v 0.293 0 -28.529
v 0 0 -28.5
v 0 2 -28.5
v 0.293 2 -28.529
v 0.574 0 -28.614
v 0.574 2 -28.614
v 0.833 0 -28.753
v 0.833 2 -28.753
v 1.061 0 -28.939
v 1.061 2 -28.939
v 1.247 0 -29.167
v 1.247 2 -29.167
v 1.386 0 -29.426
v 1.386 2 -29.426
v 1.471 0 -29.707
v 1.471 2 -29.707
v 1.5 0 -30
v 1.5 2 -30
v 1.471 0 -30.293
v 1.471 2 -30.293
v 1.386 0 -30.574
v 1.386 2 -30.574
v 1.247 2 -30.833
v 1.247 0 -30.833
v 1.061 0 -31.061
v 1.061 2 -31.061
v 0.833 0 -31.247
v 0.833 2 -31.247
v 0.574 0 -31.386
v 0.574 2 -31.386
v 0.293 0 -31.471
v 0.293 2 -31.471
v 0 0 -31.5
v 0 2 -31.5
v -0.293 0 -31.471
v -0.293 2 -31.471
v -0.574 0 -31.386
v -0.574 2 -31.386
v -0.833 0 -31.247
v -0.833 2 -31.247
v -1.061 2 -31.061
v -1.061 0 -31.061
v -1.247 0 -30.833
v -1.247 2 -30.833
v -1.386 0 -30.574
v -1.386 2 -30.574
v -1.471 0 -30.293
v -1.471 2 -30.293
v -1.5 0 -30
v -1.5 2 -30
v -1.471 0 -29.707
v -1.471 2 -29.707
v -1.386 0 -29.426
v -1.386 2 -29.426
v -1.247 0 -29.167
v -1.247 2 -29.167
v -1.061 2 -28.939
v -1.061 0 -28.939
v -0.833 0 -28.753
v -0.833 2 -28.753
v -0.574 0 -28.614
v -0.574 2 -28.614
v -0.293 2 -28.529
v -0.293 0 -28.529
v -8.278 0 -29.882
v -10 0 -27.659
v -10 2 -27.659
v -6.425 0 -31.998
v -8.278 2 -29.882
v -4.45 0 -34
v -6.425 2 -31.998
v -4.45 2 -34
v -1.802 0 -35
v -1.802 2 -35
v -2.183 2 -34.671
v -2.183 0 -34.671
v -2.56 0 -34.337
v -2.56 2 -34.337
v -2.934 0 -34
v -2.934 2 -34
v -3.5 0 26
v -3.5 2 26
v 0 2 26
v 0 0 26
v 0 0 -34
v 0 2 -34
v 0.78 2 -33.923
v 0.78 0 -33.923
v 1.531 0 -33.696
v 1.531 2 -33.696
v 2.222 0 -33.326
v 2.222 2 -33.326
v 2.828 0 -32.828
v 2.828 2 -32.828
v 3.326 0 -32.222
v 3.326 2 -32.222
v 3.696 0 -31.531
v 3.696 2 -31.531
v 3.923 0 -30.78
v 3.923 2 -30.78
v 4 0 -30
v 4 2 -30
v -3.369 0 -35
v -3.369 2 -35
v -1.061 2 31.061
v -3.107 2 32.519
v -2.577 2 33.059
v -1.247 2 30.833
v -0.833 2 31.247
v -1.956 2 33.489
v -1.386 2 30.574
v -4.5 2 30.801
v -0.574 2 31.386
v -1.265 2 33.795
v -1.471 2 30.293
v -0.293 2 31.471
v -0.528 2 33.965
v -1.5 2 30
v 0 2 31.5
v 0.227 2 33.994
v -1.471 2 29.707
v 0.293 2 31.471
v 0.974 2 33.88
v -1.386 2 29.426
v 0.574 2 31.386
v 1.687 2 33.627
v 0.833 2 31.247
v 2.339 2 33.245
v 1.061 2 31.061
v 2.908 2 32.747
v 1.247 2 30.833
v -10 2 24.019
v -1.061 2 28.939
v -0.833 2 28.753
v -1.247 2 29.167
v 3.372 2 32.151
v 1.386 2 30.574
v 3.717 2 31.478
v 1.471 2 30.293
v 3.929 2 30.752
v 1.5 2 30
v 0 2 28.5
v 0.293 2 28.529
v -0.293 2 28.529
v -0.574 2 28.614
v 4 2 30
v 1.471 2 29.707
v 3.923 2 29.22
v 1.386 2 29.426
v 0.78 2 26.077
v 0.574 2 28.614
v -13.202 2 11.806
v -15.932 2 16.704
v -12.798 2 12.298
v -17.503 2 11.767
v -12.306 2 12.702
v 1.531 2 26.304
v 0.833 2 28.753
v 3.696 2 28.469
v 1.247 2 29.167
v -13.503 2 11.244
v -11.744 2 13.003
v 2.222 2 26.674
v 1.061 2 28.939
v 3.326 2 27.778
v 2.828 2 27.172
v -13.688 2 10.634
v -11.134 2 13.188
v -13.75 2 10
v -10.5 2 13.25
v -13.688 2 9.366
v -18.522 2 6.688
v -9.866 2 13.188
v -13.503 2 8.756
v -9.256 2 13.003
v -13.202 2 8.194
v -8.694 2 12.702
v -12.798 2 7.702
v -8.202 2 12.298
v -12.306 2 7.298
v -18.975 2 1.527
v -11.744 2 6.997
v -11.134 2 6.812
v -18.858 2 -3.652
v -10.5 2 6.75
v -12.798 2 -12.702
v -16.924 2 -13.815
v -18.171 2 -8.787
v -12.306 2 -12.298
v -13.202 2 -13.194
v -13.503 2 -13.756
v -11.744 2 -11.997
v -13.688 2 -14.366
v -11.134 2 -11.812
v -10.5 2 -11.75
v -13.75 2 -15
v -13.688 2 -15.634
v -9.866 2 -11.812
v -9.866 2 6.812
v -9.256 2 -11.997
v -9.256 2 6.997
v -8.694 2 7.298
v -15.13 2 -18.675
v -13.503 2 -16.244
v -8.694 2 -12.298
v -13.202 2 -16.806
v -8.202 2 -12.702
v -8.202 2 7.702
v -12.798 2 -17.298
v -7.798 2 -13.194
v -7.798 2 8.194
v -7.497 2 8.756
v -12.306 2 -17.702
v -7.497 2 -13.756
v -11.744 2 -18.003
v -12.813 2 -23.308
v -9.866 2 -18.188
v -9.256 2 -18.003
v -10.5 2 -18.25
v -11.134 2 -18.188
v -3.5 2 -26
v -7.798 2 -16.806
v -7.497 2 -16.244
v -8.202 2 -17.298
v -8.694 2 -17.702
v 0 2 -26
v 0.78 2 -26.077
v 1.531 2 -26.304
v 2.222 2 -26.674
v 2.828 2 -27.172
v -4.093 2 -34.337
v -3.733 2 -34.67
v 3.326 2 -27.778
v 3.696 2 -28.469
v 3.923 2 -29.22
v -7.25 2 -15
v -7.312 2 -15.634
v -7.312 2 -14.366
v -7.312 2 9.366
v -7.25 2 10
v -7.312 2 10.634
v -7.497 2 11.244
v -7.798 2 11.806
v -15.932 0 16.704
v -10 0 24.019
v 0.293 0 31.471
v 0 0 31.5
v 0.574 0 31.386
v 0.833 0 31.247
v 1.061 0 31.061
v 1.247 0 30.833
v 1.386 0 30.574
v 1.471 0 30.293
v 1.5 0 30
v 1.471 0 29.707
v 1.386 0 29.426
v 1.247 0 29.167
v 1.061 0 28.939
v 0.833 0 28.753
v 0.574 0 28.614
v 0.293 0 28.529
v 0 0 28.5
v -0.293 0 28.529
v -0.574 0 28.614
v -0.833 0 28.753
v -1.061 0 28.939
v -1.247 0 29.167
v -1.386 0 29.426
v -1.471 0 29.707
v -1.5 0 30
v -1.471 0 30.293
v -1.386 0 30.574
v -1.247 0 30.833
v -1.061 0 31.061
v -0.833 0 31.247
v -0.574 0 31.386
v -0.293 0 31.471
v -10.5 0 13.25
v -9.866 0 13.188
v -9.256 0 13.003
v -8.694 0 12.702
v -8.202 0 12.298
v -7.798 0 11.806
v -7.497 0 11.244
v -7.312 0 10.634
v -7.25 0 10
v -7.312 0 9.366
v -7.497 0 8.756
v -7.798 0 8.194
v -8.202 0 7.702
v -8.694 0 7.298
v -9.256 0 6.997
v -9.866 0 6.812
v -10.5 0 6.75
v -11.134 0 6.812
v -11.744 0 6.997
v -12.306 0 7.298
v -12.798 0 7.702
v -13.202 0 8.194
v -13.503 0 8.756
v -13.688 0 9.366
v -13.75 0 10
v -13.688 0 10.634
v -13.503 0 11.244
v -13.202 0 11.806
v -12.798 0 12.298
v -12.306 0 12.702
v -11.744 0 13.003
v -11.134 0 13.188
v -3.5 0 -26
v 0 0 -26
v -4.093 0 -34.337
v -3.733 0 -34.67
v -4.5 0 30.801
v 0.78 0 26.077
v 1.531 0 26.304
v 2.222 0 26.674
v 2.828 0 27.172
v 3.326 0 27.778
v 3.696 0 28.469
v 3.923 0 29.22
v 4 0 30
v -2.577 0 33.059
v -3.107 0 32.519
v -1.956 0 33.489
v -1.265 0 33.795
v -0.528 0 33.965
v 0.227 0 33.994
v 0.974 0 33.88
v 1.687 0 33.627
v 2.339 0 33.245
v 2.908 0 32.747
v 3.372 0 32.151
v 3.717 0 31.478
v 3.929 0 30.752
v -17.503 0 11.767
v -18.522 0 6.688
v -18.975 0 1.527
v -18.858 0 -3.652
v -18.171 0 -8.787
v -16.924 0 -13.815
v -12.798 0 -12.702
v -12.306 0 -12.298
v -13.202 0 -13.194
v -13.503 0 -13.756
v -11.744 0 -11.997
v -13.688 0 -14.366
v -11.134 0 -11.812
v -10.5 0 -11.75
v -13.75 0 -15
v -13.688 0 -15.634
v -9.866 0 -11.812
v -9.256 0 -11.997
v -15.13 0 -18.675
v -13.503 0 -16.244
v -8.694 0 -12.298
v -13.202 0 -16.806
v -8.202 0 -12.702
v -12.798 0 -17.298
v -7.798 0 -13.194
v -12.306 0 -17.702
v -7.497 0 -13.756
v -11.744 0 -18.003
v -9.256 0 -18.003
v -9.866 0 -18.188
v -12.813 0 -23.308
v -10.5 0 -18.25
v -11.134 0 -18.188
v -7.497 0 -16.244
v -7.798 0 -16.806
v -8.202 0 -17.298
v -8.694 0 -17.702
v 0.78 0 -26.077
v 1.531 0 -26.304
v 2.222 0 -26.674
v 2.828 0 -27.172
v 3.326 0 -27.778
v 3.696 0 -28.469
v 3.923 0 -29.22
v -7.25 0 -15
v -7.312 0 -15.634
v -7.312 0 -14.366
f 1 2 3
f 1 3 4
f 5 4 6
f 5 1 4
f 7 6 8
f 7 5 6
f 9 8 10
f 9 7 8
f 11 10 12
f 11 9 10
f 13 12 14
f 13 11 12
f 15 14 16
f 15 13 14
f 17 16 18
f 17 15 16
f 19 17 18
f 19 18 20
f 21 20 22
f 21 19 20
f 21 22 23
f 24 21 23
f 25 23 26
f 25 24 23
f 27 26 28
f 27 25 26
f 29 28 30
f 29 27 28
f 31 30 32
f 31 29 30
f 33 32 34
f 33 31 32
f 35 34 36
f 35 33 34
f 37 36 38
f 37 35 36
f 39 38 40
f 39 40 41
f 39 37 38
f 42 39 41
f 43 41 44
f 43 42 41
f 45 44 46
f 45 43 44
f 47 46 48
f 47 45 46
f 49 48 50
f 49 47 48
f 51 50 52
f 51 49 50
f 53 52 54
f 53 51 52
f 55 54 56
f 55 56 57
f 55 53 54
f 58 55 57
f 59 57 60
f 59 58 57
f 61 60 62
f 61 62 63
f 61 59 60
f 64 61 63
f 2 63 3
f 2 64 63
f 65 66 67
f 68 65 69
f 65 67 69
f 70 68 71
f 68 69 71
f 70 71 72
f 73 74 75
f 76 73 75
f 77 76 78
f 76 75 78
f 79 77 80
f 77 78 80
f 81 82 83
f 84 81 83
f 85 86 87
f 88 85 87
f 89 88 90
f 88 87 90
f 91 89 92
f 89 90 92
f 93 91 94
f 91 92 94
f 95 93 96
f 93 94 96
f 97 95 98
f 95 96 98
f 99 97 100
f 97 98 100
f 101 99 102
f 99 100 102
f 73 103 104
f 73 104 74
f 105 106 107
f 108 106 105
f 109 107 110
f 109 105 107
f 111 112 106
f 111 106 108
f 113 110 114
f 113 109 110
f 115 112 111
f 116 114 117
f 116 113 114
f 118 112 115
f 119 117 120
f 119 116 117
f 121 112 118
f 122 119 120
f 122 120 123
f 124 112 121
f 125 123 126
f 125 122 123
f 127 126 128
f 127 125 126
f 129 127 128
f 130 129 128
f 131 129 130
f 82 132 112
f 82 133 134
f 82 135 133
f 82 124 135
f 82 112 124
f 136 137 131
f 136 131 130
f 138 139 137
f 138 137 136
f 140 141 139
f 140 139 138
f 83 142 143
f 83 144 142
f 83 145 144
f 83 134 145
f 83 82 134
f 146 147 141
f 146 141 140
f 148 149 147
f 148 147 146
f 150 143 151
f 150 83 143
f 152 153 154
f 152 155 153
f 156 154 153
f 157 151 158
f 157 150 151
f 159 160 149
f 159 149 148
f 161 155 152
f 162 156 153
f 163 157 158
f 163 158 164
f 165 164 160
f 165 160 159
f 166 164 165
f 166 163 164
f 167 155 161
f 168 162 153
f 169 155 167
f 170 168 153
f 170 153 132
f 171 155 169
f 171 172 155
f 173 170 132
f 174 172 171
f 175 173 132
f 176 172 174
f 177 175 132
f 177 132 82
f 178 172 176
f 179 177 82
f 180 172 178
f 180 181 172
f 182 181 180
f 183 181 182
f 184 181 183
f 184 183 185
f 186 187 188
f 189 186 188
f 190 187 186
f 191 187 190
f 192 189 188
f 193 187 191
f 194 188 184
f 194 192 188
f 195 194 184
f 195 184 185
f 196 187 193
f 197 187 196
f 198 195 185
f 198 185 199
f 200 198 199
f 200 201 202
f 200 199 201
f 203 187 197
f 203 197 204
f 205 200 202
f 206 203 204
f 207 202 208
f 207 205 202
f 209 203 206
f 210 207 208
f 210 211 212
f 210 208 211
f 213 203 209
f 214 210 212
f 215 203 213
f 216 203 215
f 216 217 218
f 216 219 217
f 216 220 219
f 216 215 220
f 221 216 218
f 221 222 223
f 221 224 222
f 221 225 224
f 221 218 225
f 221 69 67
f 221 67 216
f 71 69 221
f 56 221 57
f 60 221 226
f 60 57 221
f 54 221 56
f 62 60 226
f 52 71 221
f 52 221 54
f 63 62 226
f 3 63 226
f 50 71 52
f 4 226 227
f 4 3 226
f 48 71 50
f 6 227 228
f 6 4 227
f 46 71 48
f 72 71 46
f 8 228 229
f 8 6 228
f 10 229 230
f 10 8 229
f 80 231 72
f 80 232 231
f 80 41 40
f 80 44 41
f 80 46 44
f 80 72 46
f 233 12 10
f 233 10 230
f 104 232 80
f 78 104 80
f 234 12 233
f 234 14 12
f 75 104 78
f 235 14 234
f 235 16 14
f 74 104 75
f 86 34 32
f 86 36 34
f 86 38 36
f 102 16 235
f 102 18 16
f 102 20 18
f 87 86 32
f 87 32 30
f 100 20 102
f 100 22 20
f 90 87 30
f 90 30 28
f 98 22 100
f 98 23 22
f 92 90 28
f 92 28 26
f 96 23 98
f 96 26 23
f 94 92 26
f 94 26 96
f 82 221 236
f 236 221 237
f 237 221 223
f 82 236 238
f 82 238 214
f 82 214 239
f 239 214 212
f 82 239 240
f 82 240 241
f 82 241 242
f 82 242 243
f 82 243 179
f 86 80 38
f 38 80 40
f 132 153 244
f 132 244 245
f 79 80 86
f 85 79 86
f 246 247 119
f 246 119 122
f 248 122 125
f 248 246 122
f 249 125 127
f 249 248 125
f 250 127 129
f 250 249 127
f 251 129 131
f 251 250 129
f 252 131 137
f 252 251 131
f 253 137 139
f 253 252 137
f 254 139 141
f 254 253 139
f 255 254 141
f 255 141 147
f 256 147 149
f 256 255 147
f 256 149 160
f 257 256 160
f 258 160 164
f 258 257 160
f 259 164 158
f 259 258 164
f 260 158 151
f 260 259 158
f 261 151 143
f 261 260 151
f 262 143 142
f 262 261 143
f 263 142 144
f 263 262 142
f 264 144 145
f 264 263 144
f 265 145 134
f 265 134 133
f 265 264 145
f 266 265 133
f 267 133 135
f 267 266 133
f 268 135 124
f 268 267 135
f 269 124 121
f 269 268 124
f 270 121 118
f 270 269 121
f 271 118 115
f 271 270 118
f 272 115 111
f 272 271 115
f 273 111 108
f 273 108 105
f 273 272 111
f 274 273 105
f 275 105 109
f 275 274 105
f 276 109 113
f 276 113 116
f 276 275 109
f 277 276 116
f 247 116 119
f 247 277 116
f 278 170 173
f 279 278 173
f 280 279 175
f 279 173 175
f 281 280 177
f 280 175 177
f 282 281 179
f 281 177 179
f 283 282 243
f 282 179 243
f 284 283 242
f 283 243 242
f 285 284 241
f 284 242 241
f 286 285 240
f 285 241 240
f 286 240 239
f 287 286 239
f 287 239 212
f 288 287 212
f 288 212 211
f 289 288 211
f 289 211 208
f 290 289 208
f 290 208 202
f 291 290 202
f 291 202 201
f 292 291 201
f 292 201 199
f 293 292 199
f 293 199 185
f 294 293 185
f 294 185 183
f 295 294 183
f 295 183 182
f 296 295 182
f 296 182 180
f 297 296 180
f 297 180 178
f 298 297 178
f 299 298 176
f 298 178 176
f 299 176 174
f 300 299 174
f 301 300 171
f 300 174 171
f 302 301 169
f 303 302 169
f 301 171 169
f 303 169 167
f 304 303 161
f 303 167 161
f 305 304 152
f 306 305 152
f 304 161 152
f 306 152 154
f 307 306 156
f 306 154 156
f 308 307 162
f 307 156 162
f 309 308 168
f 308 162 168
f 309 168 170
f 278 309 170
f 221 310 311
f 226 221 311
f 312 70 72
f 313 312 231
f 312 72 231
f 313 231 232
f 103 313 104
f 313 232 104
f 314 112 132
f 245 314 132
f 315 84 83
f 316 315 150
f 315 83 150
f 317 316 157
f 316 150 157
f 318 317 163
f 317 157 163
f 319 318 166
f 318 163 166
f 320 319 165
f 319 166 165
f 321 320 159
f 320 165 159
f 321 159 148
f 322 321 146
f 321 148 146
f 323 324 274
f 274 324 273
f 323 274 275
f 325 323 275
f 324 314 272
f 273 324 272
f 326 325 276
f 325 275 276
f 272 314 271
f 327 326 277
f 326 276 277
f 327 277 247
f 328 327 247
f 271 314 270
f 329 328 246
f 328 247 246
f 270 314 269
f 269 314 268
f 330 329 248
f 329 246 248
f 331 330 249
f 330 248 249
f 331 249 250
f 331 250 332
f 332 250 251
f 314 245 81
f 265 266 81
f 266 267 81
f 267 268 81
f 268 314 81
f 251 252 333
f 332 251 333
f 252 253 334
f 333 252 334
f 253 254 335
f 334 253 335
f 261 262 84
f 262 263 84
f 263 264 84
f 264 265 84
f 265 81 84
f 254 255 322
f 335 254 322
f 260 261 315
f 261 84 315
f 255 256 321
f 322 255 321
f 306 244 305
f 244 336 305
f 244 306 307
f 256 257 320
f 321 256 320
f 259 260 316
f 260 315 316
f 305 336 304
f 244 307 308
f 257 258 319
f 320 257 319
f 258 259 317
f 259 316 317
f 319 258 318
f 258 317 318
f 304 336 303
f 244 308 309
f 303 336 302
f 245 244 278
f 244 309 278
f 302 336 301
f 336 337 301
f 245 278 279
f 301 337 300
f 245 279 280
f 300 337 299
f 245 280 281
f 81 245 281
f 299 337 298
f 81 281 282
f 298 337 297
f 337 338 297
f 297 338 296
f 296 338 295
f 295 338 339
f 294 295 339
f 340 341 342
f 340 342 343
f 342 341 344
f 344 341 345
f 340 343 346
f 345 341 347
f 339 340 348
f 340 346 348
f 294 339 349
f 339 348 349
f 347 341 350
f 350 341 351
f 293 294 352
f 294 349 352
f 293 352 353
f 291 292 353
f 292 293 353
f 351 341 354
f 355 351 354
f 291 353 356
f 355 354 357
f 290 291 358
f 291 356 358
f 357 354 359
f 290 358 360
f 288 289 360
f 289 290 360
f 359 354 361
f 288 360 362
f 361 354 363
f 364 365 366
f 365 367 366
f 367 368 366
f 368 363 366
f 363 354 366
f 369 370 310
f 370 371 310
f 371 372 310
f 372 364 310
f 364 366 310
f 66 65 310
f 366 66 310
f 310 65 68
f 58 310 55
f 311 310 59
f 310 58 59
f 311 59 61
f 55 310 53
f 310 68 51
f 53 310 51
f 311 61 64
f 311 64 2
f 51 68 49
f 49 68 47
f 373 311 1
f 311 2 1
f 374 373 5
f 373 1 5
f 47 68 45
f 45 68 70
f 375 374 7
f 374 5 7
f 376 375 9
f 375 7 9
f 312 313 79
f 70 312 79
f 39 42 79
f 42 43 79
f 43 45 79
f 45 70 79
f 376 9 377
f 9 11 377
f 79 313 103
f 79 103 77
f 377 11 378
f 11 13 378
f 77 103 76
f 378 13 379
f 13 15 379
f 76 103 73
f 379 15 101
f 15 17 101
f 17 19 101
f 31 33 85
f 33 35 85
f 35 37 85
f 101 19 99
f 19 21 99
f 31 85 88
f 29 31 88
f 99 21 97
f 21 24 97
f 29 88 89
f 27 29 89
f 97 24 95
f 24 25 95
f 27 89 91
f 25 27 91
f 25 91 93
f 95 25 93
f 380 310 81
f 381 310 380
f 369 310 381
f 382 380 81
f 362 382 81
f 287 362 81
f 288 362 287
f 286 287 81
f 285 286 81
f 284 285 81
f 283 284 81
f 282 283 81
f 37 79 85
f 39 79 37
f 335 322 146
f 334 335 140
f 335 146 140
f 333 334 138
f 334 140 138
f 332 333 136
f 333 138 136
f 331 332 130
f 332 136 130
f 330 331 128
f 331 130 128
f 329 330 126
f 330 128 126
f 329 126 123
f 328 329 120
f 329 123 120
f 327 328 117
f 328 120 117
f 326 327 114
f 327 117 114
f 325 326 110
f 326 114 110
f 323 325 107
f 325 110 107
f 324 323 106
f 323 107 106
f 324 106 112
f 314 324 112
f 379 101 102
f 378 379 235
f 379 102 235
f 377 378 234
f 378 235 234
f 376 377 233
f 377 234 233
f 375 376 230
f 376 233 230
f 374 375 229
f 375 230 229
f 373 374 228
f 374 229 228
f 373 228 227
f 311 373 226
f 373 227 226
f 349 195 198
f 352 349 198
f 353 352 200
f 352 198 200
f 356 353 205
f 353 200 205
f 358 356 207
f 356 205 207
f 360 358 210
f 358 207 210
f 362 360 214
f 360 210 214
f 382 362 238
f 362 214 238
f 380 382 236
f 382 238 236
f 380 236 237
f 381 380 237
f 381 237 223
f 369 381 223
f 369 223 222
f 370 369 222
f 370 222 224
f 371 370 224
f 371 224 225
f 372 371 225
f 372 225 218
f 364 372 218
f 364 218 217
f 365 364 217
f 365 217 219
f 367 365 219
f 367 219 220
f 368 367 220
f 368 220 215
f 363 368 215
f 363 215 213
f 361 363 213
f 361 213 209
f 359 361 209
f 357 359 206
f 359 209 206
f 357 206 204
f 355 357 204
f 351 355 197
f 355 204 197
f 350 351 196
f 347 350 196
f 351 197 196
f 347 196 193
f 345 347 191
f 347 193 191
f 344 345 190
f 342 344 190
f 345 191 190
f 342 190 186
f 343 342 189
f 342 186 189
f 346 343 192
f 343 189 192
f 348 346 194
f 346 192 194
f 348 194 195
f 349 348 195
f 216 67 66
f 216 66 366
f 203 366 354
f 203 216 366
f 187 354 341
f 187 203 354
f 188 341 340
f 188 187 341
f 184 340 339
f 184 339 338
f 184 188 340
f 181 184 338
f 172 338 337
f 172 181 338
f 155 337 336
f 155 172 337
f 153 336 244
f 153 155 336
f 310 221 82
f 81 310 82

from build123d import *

# Parameters (mm, degrees)
SKETCH_1_W          = 20
SKETCH_1_H          = 70
SKETCH_1_R          = 1.5
SKETCH_1_W_2        = 6
SKETCH_1_H_2        = 52
EXTRUDE_1_DEPTH     = 2
SKETCH_2_W          = 0.5
SKETCH_2_H          = 26
CUT_EXTRUDE_1_DEPTH = 37.455452267
EXTRUDE_3_DEPTH     = 2
SKETCH_4_R          = 3.25
CUT_EXTRUDE_2_DEPTH = 40.874804075


with BuildPart() as part:
    # Эскиз1 → Бобышка-Вытянуть1 (new body)
    with BuildSketch(Plane(origin=(0, 0, 0), x_dir=(1, 0, 0), z_dir=(0, 1, 0))):
        Rectangle(SKETCH_1_W, SKETCH_1_H)
        with Locations(Location((0, 30, 0), (0, 0, 270))):
            Circle(SKETCH_1_R, mode=Mode.SUBTRACT)
        with Locations(Location((0, -30, 0), (0, 0, 270))):
            Circle(SKETCH_1_R, mode=Mode.SUBTRACT)
        Rectangle(SKETCH_1_W_2, SKETCH_1_H_2, mode=Mode.SUBTRACT)
    extrude(amount=EXTRUDE_1_DEPTH)

    # Эскиз2 → Вырез-Вытянуть1 (cut, through all)
    with BuildSketch(Plane(origin=(0, 2, 0), x_dir=(1, 0, 0), z_dir=(0, 1, 0))):
        with Locations((-3.25, -13)):
            Rectangle(SKETCH_2_W, SKETCH_2_H)
        with Locations((-3.25, 13)):
            Rectangle(SKETCH_2_W, SKETCH_2_H)
        with BuildLine():
            ThreePointArc((4, 30), (2.828427125, 27.171572875), (0, 26))
            Line((0, 26), (3, 26))
            Line((3, 26), (3, 0))
            Line((3, 0), (10, 0))
            Line((10, 0), (10, 35))
            Line((10, 35), (-1.801814511, 35))
            ThreePointArc((-1.801814511, 35), (-2.371833534, 34.50465844), (-2.933620688, 34))
            Line((-2.933620688, 34), (0, 34))
            ThreePointArc((0, 34), (2.828427125, 32.828427125), (4, 30))
        make_face()
        with BuildLine():
            ThreePointArc((-10, 27.658633372), (-7.367393186, 30.953957731), (-4.449961479, 34))
            ThreePointArc((-4.449961479, 34), (-3.913284985, 34.504235123), (-3.368774283, 35))
            Line((-3.368774283, 35), (-10, 35))
            Line((-10, 35), (-10, 27.658633372))
        make_face()
        with BuildLine():
            Line((10, 0), (3, 0))
            Line((3, 0), (3, -26))
            Line((3, -26), (0, -26))
            ThreePointArc((0, -26), (2.828427125, -27.171572875), (4, -30))
            ThreePointArc((4, -30), (1.336481718, -33.770121565), (-3.106908308, -32.519349274))
            Line((-3.106908308, -32.519349274), (-4.5, -30.80136273))
            Line((-4.5, -30.80136273), (-4.5, -32.5))
            ThreePointArc((-4.5, -32.5), (-3.175976694, -33.777056798), (-1.801814511, -35))
            Line((-1.801814511, -35), (10, -35))
            Line((10, -35), (10, 0))
        make_face()
        with BuildLine():
            Line((-4.5, -32.5), (-4.5, -30.80136273))
            Line((-4.5, -30.80136273), (-10, -24.018660595))
            Line((-10, -24.018660595), (-10, -35))
            Line((-10, -35), (-1.801814511, -35))
            ThreePointArc((-1.801814511, -35), (-3.175976694, -33.777056798), (-4.5, -32.5))
        make_face()
    extrude(amount=-CUT_EXTRUDE_1_DEPTH, mode=Mode.SUBTRACT)

    # Эскиз3 → Бобышка-Вытянуть3 (add)
    with BuildSketch(Plane(origin=(0, 2, 0), x_dir=(1, 0, 0), z_dir=(0, 1, 0))):
        with BuildLine():
            Line((-15.931618932, -16.703677979), (-10, -24.018660595))
            Line((-10, -24.018660595), (-10, 27.658633372))
            ThreePointArc((-10, 27.658633372), (-18.585418451, 6.228867289), (-15.931618932, -16.703677979))
        make_face()
    extrude(amount=-EXTRUDE_3_DEPTH)

    # Эскиз4 → Вырез-Вытянуть2 (cut, through all)
    with BuildSketch(Plane(origin=(0, 2, 0), x_dir=(1, 0, 0), z_dir=(0, 1, 0))):
        with Locations(Location((-10.5, 15, 0), (0, 0, 270))):
            Circle(SKETCH_4_R)
        with Locations(Location((-10.5, -10, 0), (0, 0, 270))):
            Circle(SKETCH_4_R)
    extrude(amount=-CUT_EXTRUDE_2_DEPTH, mode=Mode.SUBTRACT)


solid = part.part
